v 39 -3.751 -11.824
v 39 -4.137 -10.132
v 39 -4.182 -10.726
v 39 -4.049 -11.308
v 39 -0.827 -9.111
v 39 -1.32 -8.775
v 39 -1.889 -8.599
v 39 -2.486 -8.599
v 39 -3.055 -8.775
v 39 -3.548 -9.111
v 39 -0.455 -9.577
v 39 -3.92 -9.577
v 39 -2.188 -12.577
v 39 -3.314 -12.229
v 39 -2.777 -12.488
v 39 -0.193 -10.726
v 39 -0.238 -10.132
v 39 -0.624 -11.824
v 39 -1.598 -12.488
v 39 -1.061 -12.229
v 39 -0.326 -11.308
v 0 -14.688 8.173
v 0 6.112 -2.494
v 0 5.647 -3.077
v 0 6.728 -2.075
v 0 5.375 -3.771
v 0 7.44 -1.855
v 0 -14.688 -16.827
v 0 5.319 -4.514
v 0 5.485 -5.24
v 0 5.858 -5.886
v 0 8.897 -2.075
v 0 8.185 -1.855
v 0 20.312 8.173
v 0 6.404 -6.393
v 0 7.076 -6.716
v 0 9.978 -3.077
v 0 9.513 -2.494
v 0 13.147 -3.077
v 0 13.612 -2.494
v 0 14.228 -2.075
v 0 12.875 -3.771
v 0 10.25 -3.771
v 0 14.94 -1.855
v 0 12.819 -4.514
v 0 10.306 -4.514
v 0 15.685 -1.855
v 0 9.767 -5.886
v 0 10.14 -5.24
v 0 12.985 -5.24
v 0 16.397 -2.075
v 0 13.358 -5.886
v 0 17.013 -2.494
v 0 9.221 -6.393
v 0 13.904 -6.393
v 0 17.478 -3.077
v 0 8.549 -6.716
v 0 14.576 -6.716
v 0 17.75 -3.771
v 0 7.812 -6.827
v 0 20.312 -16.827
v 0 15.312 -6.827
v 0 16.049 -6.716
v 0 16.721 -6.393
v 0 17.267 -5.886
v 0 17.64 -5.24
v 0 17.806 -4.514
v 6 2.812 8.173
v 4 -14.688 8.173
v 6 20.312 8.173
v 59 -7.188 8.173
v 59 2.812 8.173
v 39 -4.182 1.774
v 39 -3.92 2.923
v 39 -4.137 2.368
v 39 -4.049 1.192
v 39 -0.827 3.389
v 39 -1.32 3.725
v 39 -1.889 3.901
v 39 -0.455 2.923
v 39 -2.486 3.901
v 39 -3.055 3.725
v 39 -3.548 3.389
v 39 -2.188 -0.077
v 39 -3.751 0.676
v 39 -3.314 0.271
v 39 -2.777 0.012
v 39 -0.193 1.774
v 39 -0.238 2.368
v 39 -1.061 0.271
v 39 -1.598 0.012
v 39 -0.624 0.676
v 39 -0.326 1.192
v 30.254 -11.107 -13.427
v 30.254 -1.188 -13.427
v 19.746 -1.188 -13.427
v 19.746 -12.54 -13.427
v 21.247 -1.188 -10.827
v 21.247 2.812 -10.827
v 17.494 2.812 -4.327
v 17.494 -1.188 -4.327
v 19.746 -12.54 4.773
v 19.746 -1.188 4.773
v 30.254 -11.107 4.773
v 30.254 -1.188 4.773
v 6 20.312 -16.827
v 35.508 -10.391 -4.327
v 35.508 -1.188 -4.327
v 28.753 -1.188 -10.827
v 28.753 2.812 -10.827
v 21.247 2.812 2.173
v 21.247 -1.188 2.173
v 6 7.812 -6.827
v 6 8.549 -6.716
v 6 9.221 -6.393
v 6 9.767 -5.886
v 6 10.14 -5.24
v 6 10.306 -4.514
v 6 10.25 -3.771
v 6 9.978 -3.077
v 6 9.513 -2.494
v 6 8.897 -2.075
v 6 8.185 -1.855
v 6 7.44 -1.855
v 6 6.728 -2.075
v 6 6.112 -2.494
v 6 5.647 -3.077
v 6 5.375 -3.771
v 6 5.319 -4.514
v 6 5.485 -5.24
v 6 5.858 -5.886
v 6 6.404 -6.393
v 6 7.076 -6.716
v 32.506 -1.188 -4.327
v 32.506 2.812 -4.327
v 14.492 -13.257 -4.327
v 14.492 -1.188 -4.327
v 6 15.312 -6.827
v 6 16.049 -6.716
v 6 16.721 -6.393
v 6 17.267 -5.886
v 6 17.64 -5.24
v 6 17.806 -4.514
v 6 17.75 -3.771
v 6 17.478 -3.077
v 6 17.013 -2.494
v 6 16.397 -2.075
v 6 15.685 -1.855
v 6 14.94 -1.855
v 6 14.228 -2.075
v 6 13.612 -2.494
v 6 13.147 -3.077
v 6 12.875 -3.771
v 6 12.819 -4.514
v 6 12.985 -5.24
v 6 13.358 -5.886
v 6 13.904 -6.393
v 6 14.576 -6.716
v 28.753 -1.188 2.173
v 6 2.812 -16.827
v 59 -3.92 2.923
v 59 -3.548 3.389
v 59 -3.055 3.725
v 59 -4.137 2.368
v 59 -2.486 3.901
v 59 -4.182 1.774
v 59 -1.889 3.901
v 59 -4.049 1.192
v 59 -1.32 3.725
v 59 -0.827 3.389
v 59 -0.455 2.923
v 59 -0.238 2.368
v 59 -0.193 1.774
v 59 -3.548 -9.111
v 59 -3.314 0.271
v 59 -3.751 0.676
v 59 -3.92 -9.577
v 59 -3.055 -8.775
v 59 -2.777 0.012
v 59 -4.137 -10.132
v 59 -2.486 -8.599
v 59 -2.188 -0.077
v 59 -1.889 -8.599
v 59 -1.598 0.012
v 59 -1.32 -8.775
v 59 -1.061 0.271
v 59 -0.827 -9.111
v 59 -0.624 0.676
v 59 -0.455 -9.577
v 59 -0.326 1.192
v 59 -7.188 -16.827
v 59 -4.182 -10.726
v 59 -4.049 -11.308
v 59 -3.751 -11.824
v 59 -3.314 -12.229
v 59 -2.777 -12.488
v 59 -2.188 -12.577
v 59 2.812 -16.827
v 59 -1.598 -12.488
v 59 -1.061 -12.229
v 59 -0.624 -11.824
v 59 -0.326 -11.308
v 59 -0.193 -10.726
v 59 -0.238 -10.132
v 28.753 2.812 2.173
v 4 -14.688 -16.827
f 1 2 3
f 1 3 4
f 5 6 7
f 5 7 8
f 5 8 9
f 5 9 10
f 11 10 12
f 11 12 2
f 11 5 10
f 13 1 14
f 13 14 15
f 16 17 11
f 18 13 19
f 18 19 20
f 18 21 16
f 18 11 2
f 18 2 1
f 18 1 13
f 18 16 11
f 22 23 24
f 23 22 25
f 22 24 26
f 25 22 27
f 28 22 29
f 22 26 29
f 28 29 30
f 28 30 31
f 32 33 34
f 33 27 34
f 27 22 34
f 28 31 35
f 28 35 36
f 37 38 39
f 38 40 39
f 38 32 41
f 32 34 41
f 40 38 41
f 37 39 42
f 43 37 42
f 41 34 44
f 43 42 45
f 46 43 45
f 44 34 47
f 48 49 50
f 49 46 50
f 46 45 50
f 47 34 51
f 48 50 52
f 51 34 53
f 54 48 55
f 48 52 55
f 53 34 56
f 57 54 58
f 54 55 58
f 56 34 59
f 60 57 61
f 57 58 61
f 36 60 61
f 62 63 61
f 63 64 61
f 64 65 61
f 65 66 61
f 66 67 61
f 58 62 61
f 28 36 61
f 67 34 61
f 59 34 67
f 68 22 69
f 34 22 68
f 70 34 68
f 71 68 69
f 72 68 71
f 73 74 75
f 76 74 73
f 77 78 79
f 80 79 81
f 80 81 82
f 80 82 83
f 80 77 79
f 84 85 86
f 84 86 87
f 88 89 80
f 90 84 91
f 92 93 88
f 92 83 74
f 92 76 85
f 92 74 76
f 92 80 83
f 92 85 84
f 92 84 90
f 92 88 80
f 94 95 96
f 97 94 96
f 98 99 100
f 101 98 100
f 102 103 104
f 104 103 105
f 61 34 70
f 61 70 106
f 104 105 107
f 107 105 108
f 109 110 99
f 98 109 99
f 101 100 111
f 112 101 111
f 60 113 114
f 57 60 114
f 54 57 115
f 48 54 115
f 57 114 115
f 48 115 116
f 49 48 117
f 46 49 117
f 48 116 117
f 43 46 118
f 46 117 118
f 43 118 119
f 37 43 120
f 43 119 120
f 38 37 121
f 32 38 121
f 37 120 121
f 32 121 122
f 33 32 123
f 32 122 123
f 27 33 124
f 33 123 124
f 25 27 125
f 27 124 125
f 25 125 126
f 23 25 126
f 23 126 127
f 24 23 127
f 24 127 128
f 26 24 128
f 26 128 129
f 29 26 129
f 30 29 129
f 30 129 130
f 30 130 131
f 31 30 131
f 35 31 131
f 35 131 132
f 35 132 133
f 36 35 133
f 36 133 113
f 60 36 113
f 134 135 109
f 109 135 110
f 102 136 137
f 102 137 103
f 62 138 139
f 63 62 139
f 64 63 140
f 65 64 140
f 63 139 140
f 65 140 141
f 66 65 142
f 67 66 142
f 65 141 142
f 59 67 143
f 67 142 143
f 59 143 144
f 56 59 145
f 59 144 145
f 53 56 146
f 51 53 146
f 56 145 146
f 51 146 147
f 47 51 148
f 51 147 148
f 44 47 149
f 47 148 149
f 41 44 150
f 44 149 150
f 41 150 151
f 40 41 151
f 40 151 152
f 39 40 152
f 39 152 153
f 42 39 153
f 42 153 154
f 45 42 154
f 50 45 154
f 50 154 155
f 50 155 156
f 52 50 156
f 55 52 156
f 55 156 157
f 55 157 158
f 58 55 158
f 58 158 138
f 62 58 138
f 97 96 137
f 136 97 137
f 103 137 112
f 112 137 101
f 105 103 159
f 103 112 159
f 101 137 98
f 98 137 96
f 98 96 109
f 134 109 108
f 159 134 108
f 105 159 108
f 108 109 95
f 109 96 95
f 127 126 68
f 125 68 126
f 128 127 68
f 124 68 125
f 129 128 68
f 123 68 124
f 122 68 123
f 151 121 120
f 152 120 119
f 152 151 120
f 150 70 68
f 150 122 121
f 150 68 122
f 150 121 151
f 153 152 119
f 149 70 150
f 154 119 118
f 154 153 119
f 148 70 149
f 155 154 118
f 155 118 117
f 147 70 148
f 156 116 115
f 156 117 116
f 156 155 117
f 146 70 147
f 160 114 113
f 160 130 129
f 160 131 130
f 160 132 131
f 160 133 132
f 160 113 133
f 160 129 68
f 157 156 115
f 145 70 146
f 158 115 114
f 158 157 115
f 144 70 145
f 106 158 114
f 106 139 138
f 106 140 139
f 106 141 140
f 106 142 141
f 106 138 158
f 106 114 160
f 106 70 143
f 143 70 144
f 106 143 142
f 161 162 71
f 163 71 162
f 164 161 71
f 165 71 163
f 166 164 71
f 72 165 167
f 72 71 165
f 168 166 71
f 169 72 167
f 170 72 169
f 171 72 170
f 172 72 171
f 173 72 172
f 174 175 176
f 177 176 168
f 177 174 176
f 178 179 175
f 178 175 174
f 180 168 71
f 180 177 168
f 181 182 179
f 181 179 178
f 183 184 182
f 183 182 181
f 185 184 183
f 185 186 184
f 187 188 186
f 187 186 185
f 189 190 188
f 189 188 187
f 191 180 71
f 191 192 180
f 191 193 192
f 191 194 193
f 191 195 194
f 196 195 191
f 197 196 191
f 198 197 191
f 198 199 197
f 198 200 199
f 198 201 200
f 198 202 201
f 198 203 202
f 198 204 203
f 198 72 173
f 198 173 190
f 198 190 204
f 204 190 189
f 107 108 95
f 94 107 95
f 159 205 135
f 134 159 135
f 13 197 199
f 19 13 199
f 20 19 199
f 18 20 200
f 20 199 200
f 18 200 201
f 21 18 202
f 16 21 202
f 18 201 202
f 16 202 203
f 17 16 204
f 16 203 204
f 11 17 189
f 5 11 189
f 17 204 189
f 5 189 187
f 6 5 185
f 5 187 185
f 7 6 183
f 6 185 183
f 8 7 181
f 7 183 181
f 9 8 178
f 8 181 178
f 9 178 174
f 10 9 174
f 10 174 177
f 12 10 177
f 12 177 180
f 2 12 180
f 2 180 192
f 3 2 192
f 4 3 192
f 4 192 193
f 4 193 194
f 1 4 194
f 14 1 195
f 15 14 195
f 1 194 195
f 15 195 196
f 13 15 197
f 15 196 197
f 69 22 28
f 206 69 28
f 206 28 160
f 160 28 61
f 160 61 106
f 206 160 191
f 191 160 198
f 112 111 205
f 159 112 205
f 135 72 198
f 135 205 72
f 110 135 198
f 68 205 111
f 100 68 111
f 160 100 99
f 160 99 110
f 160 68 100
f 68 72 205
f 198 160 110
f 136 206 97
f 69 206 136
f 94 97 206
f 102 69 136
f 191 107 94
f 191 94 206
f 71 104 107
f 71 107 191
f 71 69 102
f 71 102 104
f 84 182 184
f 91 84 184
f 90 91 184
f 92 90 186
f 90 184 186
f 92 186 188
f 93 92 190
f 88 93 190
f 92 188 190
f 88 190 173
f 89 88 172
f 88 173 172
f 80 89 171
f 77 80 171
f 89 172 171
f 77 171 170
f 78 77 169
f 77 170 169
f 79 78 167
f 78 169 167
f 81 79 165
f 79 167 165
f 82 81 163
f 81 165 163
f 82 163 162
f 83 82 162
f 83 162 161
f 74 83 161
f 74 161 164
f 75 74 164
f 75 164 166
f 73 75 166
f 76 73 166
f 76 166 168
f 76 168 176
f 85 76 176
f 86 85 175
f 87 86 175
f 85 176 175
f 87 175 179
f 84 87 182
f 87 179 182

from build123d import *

# Parameters (mm, degrees)
CROQUIS3_W              = 25
CROQUIS3_H              = 35
SALIENTE_EXTRUIR2_DEPTH = 4
CROQUIS5_W              = 25
CROQUIS5_H              = 17.5
SALIENTE_EXTRUIR3_DEPTH = 2
CROQUIS7_W              = 25
CROQUIS7_H              = 10
SALIENTE_EXTRUIR5_DEPTH = 55
CROQUIS8_R              = 2.5
CORTAR_EXTRUIR1_DEPTH   = 55
SALIENTE_EXTRUIR6_DEPTH = 25
CORTAR_EXTRUIR3_DEPTH   = 4
CROQUIS11_R             = 2
CORTAR_EXTRUIR4_DEPTH   = 20
CORTAR_EXTRUIR5_DEPTH   = 45


with BuildPart() as part:
    # Croquis3 → Saliente-Extruir2 (new body)
    with BuildSketch(Plane(origin=(0, 0, 0), x_dir=(0, 0, -1), z_dir=(1, 0, 0))):
        with Locations((4.326923077, 2.8125)):
            Rectangle(CROQUIS3_W, CROQUIS3_H)
    extrude(amount=SALIENTE_EXTRUIR2_DEPTH)

    # Croquis5 → Saliente-Extruir3 (add)
    with BuildSketch(Plane(origin=(4, 0, 0), x_dir=(0, 0, -1), z_dir=(1, 0, 0))):
        with Locations((4.326923077, 11.5625)):
            Rectangle(CROQUIS5_W, CROQUIS5_H)
    extrude(amount=SALIENTE_EXTRUIR3_DEPTH)

    # Croquis7 → Saliente-Extruir5 (add)
    with BuildSketch(Plane(origin=(4, 0, 0), x_dir=(0, 0, -1), z_dir=(1, 0, 0))):
        with Locations((4.326923077, -2.1875)):
            Rectangle(CROQUIS7_W, CROQUIS7_H)
    extrude(amount=SALIENTE_EXTRUIR5_DEPTH)

    # Croquis8 → Cortar-Extruir1 (cut)
    with BuildSketch(Plane(origin=(6, 0, 0), x_dir=(0, 0, -1), z_dir=(1, 0, 0))):
        with Locations((4.326923077, 15.3125)):
            Circle(CROQUIS8_R)
        with Locations((4.326923077, 7.8125)):
            Circle(CROQUIS8_R)
    extrude(amount=-CORTAR_EXTRUIR1_DEPTH, mode=Mode.SUBTRACT)

    # Croquis10 → Saliente-Extruir6 (add, through all)
    with BuildSketch(Plane.XY.offset(8.173076923)):
        Polygon((4, -14.6875), (59, -7.1875), (4, -7.1875), align=None)
    extrude(amount=-SALIENTE_EXTRUIR6_DEPTH)

    # Croquis9 → Cortar-Extruir3 (cut)
    with BuildSketch(Plane(origin=(0, 2.8125, 0), x_dir=(1, 0, 0), z_dir=(0, 1, 0))):
        Polygon((32.505553499, 4.326923077), (28.75277675, 10.826923077), (21.24722325, 10.826923077), (17.494446501, 4.326923077), (21.24722325, -2.173076923), (28.75277675, -2.173076923), align=None)
    extrude(amount=-CORTAR_EXTRUIR3_DEPTH, mode=Mode.SUBTRACT)

    # Croquis11 → Cortar-Extruir4 (cut)
    with BuildSketch(Plane(origin=(59, 0, 0), x_dir=(0, 0, -1), z_dir=(1, 0, 0))):
        with Locations((-1.923076923, -2.1875)):
            Circle(CROQUIS11_R)
        with Locations((10.576923077, -2.1875)):
            Circle(CROQUIS11_R)
    extrude(amount=-CORTAR_EXTRUIR4_DEPTH, mode=Mode.SUBTRACT)

    # Croquis12 → Cortar-Extruir5 (cut)
    with BuildSketch(Plane(origin=(0, -1.1875, 0), x_dir=(1, 0, 0), z_dir=(0, 1, 0))):
        Polygon((30.25388745, 13.426923077), (19.74611255, 13.426923077), (14.492225101, 4.326923077), (19.74611255, -4.773076923), (30.25388745, -4.773076923), (35.507774899, 4.326923077), align=None)
    extrude(amount=-CORTAR_EXTRUIR5_DEPTH, mode=Mode.SUBTRACT)


solid = part.part
